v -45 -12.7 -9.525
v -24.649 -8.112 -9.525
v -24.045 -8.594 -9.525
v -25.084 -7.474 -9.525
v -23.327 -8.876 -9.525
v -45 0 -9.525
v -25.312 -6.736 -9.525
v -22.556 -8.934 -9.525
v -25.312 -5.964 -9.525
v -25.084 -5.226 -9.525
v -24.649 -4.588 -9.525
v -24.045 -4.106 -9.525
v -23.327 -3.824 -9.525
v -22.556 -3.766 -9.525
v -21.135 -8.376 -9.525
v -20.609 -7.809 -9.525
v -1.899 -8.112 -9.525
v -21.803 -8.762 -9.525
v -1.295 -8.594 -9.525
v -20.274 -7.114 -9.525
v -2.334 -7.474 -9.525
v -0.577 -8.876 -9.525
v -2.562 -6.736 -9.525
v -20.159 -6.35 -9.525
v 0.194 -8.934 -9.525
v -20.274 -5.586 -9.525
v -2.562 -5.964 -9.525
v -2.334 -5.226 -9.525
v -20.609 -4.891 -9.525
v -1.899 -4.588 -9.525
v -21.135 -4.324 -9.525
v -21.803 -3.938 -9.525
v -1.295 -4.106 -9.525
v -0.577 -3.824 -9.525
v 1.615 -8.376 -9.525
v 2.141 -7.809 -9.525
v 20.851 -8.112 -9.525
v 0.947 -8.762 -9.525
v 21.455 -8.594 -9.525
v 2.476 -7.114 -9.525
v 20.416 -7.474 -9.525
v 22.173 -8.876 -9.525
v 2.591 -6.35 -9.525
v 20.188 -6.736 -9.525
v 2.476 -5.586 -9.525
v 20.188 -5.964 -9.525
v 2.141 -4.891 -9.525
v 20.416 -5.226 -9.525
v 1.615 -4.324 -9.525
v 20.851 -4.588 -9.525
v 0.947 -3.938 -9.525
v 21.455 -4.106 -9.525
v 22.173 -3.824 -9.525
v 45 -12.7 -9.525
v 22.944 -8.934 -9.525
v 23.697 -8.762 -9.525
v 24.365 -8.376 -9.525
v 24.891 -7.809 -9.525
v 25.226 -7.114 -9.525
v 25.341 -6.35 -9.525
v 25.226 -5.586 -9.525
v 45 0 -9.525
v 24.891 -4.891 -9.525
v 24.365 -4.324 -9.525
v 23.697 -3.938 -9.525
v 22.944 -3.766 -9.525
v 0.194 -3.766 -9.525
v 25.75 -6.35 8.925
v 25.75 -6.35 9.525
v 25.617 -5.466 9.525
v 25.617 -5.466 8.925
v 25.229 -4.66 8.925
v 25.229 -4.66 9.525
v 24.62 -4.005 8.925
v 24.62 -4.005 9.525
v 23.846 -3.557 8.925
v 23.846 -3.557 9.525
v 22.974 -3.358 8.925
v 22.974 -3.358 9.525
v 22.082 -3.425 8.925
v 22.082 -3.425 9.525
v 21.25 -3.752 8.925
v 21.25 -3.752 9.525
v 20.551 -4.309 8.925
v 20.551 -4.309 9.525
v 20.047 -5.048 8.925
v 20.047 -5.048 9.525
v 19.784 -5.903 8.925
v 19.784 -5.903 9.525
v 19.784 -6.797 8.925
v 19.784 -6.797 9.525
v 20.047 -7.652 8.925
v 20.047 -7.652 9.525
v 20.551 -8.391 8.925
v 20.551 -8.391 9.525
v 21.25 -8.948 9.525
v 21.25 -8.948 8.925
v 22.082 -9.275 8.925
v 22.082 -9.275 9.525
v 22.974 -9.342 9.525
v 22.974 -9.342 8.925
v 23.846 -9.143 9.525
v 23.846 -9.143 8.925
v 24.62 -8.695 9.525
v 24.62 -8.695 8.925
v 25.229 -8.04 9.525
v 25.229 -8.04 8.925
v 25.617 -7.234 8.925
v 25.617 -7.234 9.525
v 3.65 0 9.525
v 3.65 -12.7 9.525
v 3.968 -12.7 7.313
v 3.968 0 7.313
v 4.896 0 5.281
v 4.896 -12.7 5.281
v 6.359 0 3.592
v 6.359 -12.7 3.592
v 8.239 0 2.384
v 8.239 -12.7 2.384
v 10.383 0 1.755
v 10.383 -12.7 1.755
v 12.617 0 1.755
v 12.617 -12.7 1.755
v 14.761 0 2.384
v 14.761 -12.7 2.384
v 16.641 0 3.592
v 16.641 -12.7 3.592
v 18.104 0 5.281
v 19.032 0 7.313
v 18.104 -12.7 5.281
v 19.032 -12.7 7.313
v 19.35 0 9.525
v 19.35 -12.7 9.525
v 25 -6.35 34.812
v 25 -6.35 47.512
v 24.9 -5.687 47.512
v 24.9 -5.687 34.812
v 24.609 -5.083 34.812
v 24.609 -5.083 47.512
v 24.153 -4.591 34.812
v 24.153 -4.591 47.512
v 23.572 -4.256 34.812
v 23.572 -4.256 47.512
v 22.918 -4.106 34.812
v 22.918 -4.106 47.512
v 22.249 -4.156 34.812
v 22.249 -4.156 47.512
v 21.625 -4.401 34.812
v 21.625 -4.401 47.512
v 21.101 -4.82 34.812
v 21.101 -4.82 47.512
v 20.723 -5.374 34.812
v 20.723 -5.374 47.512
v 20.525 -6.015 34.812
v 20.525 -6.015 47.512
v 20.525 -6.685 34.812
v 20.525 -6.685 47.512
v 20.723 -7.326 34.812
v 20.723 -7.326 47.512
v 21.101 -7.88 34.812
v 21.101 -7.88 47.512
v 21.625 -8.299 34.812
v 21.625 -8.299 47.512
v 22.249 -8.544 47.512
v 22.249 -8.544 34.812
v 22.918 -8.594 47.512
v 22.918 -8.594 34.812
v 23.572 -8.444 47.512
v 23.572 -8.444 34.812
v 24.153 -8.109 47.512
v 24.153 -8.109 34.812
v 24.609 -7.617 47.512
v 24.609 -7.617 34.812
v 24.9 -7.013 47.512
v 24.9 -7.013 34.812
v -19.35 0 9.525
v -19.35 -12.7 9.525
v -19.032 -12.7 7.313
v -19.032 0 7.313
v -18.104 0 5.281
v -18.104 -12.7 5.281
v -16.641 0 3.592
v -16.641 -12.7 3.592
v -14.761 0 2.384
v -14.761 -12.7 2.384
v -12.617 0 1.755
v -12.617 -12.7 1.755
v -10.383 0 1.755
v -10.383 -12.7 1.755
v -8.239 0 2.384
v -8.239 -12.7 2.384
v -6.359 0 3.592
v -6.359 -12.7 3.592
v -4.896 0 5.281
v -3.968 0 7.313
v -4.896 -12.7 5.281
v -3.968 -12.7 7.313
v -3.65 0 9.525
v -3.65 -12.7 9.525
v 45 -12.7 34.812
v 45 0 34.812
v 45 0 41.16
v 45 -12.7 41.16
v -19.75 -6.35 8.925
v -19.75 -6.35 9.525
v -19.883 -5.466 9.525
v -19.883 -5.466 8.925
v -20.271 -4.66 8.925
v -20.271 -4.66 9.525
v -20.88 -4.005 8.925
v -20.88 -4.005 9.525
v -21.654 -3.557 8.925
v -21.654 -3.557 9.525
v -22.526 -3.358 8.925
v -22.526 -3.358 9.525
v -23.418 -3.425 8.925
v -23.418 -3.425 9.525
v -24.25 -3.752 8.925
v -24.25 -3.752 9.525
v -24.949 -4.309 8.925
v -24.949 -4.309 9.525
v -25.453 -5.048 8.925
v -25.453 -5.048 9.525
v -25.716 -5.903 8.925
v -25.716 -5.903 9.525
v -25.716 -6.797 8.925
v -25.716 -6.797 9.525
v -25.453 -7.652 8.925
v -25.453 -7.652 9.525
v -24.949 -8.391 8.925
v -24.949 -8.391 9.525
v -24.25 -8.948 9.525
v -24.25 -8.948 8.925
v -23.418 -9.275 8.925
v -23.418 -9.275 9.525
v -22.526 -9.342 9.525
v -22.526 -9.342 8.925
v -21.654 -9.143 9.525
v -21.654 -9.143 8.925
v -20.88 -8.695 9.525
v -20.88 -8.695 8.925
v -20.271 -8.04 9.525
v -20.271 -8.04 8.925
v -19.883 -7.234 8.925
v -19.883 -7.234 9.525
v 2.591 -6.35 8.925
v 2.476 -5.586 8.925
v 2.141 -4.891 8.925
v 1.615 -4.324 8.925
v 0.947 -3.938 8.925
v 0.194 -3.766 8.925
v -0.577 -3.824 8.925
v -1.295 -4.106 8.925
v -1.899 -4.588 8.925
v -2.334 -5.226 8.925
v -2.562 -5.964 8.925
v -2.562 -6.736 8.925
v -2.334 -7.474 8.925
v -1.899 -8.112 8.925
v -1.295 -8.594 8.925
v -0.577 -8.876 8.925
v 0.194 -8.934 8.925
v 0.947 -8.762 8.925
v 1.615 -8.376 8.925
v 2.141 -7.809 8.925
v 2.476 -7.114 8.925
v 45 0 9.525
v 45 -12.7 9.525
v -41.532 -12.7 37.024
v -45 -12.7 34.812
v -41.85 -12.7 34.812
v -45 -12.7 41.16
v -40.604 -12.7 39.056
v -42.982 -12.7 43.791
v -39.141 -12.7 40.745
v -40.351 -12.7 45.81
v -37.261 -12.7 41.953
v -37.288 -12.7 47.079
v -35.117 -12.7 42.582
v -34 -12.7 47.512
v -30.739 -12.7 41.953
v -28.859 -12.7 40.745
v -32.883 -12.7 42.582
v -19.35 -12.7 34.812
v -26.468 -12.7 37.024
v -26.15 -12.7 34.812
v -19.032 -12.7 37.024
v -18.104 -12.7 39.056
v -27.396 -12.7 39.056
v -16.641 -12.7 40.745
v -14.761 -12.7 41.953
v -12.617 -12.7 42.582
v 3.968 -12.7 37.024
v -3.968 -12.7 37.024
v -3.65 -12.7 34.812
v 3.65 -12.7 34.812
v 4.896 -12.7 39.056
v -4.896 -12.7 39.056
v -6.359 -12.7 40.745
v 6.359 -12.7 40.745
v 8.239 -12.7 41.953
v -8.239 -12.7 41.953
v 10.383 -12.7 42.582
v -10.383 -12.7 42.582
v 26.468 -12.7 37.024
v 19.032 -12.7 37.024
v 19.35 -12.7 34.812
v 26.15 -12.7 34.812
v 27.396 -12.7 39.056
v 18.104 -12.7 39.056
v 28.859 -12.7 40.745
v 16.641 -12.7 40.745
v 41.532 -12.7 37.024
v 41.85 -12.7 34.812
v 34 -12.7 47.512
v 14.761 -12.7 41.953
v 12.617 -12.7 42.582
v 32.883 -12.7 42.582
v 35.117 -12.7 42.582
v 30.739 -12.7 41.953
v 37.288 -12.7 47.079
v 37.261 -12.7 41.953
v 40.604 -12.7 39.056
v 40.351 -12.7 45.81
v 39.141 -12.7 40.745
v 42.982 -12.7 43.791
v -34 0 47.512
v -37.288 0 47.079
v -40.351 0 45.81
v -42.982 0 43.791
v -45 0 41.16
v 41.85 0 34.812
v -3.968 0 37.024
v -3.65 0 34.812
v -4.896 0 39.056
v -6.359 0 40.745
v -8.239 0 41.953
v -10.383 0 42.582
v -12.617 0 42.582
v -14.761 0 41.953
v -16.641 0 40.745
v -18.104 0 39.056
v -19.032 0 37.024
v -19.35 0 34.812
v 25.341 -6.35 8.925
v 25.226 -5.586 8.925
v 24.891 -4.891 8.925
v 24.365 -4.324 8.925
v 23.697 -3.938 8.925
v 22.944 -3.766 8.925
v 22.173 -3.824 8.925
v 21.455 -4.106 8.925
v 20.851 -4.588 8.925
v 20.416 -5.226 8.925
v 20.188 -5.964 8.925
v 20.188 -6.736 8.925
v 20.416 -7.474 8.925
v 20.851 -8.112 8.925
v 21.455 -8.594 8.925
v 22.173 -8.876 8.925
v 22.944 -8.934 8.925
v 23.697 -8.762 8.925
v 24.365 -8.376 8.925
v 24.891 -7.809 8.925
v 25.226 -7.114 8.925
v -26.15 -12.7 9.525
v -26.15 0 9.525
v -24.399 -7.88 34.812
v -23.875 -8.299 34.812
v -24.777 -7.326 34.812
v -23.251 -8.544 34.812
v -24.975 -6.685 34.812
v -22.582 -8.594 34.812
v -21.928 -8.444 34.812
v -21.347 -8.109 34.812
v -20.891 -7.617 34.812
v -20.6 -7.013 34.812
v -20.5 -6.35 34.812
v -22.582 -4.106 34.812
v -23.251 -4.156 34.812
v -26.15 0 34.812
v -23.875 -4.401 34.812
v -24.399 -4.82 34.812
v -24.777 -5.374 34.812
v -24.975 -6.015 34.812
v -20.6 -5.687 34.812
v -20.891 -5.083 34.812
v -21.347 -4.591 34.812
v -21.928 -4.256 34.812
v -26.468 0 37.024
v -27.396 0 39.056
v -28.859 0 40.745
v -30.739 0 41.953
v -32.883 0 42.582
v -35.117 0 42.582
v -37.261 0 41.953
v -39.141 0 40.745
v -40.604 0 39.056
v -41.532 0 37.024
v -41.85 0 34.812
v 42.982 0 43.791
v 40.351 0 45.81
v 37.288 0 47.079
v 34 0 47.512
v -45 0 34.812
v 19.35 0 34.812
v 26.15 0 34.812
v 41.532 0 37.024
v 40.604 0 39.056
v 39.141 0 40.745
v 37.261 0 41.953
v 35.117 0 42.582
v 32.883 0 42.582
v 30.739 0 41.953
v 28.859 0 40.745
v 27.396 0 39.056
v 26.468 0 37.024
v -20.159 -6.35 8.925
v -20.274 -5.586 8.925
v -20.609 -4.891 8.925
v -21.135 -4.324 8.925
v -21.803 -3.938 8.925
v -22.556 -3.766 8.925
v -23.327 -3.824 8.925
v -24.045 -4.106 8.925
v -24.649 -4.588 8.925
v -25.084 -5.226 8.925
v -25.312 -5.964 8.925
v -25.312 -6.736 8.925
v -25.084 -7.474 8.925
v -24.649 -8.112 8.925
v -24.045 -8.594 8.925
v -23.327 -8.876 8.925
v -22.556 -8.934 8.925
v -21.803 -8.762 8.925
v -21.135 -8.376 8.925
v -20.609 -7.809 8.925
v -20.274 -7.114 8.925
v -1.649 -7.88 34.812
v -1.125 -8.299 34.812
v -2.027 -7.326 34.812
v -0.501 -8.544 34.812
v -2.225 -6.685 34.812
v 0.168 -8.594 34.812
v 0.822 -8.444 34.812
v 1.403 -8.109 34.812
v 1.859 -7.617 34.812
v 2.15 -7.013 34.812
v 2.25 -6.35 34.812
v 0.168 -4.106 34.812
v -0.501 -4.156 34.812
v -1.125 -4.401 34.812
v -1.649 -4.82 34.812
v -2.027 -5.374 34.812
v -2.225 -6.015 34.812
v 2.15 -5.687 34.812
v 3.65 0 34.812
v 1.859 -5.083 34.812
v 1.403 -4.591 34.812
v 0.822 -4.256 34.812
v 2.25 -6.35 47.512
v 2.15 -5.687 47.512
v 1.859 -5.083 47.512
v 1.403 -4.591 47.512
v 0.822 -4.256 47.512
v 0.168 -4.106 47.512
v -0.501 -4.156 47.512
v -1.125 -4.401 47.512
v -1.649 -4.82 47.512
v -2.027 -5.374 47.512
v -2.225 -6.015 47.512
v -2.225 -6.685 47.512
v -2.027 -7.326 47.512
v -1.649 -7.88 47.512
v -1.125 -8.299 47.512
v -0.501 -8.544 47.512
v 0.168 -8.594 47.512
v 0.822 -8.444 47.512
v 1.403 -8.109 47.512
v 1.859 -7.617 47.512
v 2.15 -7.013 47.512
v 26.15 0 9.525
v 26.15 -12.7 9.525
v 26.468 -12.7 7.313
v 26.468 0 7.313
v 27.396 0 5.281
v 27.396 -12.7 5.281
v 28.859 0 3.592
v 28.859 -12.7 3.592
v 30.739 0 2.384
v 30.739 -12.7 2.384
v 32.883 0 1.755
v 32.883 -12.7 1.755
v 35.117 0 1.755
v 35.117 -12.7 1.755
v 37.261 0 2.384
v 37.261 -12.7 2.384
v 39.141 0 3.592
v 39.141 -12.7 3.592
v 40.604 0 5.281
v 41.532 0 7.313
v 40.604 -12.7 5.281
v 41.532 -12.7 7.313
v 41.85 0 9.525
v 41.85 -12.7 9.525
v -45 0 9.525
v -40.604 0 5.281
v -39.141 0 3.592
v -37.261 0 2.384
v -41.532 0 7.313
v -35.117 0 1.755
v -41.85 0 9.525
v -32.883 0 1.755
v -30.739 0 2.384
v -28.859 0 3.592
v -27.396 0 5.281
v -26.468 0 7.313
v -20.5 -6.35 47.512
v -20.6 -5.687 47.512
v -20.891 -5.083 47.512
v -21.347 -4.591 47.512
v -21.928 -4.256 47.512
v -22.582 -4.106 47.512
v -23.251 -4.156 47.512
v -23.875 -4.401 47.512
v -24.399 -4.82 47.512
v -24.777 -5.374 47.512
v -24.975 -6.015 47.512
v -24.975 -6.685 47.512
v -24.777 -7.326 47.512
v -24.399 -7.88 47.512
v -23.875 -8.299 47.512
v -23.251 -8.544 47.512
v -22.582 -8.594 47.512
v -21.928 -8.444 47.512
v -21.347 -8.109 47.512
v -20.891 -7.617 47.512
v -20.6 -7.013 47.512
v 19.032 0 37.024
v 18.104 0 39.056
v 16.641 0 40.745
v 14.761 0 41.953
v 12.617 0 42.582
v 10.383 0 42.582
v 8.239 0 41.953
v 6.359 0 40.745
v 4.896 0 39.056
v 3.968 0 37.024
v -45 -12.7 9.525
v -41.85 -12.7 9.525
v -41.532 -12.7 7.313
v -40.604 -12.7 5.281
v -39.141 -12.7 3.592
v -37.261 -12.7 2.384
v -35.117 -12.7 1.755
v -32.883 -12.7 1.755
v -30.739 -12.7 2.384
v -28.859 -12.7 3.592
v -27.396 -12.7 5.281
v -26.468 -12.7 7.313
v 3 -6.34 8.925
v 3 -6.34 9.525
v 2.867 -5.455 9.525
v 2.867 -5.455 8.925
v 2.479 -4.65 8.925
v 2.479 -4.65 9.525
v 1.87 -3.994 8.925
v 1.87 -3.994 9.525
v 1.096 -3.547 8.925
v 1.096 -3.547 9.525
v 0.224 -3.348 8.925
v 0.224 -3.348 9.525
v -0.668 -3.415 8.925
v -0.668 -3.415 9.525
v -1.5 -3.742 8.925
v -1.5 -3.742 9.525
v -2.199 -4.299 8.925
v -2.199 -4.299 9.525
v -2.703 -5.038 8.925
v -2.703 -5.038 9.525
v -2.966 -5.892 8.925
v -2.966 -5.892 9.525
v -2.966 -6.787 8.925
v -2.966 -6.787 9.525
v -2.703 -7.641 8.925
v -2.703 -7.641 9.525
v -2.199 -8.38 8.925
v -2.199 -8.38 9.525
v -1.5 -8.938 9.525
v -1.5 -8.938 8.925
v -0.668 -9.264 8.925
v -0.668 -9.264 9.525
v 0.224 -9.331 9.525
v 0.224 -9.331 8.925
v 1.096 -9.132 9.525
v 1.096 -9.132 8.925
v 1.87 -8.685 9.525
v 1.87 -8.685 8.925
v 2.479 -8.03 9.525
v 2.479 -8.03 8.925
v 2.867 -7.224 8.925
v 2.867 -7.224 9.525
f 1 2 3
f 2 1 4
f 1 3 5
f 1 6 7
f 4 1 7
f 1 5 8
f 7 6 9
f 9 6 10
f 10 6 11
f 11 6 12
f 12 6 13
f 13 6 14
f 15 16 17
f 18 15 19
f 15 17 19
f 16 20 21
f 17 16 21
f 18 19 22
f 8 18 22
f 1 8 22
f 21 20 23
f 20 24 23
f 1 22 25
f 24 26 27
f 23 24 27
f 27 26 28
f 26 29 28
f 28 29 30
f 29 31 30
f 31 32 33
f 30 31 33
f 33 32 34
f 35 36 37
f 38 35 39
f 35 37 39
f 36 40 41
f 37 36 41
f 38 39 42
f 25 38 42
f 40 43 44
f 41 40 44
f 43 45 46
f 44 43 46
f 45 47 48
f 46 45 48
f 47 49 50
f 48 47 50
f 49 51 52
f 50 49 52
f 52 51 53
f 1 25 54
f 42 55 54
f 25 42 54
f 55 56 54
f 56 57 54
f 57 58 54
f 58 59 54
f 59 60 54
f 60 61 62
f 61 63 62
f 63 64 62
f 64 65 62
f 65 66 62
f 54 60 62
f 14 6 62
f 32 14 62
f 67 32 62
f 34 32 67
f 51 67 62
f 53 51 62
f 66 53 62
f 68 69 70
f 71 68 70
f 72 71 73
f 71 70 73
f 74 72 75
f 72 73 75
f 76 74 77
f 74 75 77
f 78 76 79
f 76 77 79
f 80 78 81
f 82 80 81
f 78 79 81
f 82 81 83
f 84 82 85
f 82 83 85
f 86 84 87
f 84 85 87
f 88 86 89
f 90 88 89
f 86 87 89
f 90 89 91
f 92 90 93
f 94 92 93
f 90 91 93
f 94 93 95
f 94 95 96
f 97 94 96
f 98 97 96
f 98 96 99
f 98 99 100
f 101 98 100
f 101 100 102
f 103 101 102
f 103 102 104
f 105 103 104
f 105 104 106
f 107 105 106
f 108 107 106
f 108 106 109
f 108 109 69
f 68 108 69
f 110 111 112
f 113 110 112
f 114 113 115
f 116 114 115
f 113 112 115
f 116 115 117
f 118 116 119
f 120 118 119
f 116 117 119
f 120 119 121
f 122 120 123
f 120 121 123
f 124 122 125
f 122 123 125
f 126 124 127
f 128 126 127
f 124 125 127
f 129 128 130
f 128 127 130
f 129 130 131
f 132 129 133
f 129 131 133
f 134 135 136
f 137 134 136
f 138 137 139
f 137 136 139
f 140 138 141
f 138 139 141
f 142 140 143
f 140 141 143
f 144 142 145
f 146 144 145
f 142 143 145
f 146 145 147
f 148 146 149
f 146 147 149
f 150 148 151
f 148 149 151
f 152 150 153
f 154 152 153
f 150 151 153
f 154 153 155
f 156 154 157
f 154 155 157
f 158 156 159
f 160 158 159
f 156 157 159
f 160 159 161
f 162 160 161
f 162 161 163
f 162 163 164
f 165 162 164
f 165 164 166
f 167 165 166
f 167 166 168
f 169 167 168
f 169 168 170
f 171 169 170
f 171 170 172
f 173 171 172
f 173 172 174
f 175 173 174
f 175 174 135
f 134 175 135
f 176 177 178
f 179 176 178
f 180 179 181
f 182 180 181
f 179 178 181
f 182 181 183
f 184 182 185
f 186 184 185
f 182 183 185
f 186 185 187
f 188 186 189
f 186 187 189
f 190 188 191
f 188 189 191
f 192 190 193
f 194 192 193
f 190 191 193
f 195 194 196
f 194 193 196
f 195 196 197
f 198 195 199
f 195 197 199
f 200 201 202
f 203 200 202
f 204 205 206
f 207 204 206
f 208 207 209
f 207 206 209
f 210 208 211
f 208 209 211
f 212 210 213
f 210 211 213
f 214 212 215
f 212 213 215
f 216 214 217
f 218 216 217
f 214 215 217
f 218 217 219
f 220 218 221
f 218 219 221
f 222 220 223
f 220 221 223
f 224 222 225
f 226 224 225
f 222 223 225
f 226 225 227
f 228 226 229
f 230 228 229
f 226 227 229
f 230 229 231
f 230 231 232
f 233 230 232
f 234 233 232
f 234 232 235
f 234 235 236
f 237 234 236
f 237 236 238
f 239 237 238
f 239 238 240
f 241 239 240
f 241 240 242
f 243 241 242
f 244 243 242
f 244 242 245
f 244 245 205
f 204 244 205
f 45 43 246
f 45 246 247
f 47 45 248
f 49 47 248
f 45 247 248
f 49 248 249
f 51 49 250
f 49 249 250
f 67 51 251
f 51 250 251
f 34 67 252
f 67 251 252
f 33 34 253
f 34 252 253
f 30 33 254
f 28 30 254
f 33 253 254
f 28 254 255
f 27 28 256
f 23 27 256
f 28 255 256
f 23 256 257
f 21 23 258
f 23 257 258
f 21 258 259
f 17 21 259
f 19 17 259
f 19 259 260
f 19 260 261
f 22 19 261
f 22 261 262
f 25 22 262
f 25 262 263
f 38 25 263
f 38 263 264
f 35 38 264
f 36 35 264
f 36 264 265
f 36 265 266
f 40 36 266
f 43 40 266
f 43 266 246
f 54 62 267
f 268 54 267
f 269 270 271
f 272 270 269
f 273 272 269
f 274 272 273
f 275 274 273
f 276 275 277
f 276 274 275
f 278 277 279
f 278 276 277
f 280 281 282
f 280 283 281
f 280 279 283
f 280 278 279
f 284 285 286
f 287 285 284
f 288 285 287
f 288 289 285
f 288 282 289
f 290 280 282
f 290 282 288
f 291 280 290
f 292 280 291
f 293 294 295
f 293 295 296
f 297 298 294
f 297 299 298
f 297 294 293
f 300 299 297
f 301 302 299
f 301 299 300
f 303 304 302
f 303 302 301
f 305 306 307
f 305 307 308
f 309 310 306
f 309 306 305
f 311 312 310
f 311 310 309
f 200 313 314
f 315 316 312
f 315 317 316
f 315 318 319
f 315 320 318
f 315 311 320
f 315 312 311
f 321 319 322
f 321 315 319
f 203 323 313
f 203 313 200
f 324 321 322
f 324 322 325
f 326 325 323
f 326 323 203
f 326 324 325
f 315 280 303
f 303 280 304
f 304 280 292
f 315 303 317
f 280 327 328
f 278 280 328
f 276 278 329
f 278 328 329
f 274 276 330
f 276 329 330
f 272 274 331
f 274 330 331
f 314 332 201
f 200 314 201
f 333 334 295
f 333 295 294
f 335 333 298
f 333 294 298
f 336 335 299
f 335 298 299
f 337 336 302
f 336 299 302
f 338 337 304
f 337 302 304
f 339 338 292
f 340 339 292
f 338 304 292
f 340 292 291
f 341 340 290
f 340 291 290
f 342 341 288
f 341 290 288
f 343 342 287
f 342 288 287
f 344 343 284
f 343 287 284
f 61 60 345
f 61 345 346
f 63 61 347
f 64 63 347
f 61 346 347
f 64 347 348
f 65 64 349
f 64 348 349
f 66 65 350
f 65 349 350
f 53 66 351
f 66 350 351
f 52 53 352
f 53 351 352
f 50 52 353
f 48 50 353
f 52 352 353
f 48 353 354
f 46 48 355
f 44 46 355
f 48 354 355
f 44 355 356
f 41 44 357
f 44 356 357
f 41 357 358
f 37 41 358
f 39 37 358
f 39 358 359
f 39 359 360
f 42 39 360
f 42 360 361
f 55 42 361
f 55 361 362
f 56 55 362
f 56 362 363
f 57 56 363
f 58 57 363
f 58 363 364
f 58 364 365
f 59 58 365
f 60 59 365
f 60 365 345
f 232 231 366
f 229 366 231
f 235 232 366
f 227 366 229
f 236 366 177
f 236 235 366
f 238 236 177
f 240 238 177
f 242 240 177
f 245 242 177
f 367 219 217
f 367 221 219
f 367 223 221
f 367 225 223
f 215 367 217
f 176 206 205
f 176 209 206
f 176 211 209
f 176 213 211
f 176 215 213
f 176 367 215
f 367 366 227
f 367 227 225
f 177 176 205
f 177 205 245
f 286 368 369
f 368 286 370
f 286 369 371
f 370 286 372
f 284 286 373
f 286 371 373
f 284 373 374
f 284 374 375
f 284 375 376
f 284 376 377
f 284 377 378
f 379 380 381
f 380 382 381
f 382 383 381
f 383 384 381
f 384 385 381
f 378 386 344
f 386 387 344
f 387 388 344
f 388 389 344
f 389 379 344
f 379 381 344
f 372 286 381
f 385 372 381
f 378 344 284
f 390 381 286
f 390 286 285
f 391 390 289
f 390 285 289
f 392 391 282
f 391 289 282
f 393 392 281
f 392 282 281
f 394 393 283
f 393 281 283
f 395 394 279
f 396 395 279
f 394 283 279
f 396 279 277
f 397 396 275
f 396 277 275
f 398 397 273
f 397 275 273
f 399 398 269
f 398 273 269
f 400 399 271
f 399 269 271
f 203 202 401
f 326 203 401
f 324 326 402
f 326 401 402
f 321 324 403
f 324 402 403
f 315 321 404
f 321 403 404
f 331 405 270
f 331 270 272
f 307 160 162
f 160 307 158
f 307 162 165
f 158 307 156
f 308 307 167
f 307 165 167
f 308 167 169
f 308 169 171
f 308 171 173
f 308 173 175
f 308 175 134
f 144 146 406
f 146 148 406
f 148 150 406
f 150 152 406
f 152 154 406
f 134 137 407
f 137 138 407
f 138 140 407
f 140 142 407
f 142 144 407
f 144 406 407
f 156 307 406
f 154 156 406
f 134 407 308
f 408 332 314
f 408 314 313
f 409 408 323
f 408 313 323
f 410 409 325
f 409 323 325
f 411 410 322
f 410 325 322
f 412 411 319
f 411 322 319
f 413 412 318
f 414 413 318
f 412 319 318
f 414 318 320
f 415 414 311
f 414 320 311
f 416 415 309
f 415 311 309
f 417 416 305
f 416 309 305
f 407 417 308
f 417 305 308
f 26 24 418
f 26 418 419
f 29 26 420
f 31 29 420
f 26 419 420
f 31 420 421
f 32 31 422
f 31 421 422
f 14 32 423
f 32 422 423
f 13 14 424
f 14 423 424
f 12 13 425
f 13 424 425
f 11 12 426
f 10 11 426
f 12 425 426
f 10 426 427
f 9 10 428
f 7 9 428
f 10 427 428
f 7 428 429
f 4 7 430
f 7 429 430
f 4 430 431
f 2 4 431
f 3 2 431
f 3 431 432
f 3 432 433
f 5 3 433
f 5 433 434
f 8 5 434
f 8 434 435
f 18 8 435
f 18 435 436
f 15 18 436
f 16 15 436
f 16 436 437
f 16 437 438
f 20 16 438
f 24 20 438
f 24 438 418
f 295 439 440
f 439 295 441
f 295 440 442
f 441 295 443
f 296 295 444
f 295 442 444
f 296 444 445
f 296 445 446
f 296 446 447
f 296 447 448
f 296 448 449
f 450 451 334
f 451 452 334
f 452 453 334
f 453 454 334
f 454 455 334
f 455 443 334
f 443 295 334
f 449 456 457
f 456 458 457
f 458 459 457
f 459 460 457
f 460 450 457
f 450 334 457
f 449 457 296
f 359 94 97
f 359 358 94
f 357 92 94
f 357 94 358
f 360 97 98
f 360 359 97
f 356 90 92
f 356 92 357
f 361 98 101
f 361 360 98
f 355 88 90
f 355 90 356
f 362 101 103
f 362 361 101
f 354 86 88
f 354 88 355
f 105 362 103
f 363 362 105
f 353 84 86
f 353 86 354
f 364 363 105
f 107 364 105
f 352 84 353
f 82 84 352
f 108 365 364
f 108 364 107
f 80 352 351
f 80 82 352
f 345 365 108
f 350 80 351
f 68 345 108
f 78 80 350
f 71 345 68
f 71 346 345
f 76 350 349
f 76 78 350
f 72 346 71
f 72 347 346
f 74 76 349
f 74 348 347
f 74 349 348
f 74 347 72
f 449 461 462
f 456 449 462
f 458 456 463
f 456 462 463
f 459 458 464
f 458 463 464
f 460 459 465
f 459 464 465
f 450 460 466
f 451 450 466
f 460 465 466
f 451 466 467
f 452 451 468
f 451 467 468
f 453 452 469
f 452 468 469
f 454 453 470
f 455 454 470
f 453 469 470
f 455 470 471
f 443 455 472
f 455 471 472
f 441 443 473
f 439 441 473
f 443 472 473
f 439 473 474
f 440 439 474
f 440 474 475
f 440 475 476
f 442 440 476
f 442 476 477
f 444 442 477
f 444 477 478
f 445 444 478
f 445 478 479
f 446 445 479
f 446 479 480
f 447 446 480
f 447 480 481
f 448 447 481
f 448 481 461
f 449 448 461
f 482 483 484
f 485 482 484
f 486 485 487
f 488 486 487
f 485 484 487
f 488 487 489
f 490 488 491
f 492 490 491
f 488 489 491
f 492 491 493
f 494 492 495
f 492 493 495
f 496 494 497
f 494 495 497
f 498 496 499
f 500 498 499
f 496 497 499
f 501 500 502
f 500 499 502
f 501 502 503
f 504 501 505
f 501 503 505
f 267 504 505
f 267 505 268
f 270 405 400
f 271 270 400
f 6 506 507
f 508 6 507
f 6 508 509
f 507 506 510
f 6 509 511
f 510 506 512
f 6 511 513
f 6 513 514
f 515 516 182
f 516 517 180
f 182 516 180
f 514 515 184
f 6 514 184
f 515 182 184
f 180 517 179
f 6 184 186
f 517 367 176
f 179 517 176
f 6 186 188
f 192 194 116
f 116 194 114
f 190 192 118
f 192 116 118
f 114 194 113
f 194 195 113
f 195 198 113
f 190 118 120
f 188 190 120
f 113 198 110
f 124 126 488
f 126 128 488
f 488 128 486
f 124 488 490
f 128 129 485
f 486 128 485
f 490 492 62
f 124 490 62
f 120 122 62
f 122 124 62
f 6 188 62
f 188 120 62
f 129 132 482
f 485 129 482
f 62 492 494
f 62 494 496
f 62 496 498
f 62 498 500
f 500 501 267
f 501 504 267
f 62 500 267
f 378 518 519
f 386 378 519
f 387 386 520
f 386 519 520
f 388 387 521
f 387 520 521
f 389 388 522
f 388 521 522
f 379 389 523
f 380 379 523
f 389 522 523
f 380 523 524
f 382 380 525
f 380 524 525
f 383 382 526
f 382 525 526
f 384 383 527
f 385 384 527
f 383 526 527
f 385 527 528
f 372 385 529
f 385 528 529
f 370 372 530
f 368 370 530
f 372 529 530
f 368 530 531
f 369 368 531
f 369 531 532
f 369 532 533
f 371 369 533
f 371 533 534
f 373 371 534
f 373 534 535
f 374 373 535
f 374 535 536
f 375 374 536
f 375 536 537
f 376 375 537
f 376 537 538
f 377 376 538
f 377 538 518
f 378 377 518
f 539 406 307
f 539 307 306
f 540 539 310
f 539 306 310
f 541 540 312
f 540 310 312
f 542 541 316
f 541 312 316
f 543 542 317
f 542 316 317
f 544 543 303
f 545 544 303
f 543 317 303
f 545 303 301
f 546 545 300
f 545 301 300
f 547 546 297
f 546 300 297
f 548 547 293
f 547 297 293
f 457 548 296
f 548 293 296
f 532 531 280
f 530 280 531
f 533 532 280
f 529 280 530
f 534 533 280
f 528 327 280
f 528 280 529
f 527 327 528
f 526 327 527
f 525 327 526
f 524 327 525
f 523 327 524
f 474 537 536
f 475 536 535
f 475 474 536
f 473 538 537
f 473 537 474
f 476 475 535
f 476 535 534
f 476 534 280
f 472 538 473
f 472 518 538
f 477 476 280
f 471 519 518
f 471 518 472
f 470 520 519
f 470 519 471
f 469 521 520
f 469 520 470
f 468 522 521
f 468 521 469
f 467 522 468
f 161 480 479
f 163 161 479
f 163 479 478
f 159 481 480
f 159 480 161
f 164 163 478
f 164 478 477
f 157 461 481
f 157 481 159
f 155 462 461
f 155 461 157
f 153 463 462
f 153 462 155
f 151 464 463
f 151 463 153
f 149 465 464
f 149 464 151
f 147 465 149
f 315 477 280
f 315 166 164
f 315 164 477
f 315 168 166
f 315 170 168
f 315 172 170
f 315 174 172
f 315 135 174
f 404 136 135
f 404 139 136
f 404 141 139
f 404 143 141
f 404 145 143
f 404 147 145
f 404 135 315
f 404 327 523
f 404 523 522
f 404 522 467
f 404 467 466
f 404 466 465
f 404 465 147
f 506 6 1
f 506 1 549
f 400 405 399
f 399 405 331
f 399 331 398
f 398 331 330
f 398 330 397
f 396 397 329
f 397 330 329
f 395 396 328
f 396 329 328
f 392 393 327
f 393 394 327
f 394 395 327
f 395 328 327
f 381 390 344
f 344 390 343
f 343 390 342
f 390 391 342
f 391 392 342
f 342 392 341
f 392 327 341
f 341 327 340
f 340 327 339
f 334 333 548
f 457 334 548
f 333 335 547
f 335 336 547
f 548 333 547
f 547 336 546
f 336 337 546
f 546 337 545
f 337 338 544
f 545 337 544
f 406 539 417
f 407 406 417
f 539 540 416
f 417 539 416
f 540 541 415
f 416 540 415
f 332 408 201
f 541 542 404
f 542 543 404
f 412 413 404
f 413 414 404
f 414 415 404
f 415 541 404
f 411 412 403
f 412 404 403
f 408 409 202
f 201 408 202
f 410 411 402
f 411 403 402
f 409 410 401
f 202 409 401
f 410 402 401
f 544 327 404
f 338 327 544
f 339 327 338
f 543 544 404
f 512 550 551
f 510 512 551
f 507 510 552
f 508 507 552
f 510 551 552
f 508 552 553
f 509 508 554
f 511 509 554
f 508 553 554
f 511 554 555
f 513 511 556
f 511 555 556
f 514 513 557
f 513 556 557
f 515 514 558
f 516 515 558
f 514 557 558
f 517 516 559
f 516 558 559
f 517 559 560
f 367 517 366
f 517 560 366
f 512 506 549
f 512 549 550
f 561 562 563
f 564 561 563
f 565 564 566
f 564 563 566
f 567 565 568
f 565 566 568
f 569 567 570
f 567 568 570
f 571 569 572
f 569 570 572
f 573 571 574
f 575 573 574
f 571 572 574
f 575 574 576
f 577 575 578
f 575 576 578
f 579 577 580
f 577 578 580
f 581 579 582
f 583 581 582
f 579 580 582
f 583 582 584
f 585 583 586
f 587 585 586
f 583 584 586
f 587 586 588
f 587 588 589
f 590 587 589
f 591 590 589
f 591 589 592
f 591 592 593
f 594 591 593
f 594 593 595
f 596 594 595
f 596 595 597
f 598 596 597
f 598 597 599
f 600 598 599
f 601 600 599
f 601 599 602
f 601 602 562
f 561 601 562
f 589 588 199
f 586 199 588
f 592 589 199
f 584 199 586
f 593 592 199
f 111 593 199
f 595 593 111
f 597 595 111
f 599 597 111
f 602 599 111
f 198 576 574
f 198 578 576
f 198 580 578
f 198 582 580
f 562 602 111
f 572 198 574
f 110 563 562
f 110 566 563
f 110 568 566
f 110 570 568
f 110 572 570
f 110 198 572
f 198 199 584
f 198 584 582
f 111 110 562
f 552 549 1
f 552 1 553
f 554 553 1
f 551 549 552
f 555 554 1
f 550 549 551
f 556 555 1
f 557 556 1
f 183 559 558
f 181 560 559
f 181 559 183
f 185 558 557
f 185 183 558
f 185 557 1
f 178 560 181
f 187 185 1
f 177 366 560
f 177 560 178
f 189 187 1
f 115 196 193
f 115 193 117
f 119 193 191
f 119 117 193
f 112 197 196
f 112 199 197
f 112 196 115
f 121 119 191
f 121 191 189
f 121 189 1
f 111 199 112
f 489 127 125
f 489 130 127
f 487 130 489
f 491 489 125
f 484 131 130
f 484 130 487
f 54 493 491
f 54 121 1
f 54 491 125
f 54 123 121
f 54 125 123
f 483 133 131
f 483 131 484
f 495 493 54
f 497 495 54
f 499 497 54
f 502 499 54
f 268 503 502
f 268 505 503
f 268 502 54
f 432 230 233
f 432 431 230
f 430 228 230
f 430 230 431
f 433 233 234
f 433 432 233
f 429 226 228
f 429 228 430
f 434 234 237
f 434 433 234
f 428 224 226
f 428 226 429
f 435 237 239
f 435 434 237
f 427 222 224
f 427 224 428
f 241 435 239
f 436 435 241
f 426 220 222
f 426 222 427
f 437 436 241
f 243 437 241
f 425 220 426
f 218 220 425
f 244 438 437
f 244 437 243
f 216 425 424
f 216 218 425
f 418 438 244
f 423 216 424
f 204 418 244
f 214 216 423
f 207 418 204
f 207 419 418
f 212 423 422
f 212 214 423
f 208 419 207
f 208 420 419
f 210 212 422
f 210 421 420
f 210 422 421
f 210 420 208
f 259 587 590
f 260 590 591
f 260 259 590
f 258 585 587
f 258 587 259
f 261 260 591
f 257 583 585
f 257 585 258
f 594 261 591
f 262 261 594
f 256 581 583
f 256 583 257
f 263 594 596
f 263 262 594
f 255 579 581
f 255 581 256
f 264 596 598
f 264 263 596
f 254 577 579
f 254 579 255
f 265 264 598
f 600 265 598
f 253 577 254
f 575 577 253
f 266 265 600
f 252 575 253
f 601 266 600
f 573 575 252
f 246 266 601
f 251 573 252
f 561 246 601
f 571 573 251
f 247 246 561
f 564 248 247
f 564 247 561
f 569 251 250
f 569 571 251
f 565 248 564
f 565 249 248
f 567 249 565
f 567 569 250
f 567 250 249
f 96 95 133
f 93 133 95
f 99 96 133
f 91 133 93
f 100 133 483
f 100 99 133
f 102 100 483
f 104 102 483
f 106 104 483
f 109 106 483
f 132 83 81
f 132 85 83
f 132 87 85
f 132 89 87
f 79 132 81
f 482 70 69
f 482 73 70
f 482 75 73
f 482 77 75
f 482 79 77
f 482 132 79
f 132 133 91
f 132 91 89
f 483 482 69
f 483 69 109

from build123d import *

# Parameters (mm, degrees)
F0_W      = 90
F0_H      = 19.05
F1_DEPTH  = 12.7
F2_R      = 7.85
F3_DEPTH  = 25.4
F4_W      = 90
F4_H      = 12.7
F5_DEPTH  = 12.7
F6_R      = 7.85
F7_DEPTH  = 25.4
F8_R      = 2.25
F9_DEPTH  = 25.4
F10_R     = 2.5908
F11_DEPTH = 20
F12_R     = 3
F13_DEPTH = 0.5
F14_DEPTH = 0.6
F16_DEPTH = 12.7


with BuildPart() as f1:
    # F0 (on Front) → F1 (new body)
    with BuildSketch(Plane.XZ):
        Rectangle(F0_W, F0_H)
    extrude(amount=F1_DEPTH)

    # F2 (on face) → F3 (cut)
    with BuildSketch(Plane.XZ.offset(12.7)):
        with Locations((-34, 9.525)):
            Circle(F2_R)
        with Locations((-11.5, 9.525)):
            Circle(F2_R)
        with Locations((11.5, 9.525)):
            Circle(F2_R)
        with Locations((34, 9.525)):
            Circle(F2_R)
    extrude(amount=-F3_DEPTH, mode=Mode.SUBTRACT)

    # F10 (on face) → F11 (cut)
    with BuildSketch(Plane.XY.offset(9.525)):
        with Locations((-22.75, -6.35)):
            Circle(F10_R)
        with Locations((0, -6.35)):
            Circle(F10_R)
        with Locations((22.75, -6.35)):
            Circle(F10_R)
    extrude(amount=-F11_DEPTH, mode=Mode.SUBTRACT)

    # F12 (on face) → F13 (cut)
    with BuildSketch(Plane.XY.offset(9.525)):
        with Locations((-22.75, -6.35)):
            Circle(F12_R)
        with Locations((22.75, -6.35)):
            Circle(F12_R)
        with Locations((0, -6.339623)):
            Circle(F12_R)
    extrude(amount=-F13_DEPTH, mode=Mode.SUBTRACT)

    # F12 (on face) → F14 (cut)
    with BuildSketch(Plane.XY.offset(9.525)):
        with Locations((-22.75, -6.35)):
            Circle(F12_R)
        with Locations((22.75, -6.35)):
            Circle(F12_R)
        with Locations((0, -6.339623)):
            Circle(F12_R)
    extrude(amount=-F14_DEPTH, mode=Mode.SUBTRACT)


with BuildPart() as f5:
    # F4 (on Front) → F5 (new body)
    with BuildSketch(Plane.XZ):
        with Locations((0, 41.162375)):
            Rectangle(F4_W, F4_H)
    extrude(amount=F5_DEPTH)

    # F6 (on face) → F7 (cut)
    with BuildSketch(Plane.XZ.offset(12.7)):
        with Locations((-34, 34.812375)):
            Circle(F6_R)
        with Locations((-11.5, 34.812375)):
            Circle(F6_R)
        with Locations((11.5, 34.812375)):
            Circle(F6_R)
        with Locations((34, 34.812375)):
            Circle(F6_R)
    extrude(amount=-F7_DEPTH, mode=Mode.SUBTRACT)

    # F8 (on face) → F9 (cut)
    with BuildSketch(Plane.XY.offset(47.512375)):
        with Locations((-22.75, -6.35)):
            Circle(F8_R)
        with Locations((0, -6.35)):
            Circle(F8_R)
        with Locations((22.75, -6.35)):
            Circle(F8_R)
    extrude(amount=-F9_DEPTH, mode=Mode.SUBTRACT)

    # F15 (on face) → F16 (cut, through all)
    with BuildSketch(Plane(origin=(0, 0, 0), x_dir=(-1, 0, 0), z_dir=(0, 1, 0))):
        with BuildLine():
            ThreePointArc((34, 47.512375), (40.35128, 45.810159), (45, 41.159816))
            Line((45, 41.159816), (45, 47.512375))
            Line((45, 47.512375), (34, 47.512375))
        make_face()
        with BuildLine():
            ThreePointArc((-45, 41.159816), (-40.35128, 45.810159), (-34, 47.512375))
            Line((-34, 47.512375), (-45, 47.512375))
            Line((-45, 47.512375), (-45, 41.159816))
        make_face()
    extrude(amount=-F16_DEPTH, mode=Mode.SUBTRACT)


solid = Compound([f1.part, f5.part])
